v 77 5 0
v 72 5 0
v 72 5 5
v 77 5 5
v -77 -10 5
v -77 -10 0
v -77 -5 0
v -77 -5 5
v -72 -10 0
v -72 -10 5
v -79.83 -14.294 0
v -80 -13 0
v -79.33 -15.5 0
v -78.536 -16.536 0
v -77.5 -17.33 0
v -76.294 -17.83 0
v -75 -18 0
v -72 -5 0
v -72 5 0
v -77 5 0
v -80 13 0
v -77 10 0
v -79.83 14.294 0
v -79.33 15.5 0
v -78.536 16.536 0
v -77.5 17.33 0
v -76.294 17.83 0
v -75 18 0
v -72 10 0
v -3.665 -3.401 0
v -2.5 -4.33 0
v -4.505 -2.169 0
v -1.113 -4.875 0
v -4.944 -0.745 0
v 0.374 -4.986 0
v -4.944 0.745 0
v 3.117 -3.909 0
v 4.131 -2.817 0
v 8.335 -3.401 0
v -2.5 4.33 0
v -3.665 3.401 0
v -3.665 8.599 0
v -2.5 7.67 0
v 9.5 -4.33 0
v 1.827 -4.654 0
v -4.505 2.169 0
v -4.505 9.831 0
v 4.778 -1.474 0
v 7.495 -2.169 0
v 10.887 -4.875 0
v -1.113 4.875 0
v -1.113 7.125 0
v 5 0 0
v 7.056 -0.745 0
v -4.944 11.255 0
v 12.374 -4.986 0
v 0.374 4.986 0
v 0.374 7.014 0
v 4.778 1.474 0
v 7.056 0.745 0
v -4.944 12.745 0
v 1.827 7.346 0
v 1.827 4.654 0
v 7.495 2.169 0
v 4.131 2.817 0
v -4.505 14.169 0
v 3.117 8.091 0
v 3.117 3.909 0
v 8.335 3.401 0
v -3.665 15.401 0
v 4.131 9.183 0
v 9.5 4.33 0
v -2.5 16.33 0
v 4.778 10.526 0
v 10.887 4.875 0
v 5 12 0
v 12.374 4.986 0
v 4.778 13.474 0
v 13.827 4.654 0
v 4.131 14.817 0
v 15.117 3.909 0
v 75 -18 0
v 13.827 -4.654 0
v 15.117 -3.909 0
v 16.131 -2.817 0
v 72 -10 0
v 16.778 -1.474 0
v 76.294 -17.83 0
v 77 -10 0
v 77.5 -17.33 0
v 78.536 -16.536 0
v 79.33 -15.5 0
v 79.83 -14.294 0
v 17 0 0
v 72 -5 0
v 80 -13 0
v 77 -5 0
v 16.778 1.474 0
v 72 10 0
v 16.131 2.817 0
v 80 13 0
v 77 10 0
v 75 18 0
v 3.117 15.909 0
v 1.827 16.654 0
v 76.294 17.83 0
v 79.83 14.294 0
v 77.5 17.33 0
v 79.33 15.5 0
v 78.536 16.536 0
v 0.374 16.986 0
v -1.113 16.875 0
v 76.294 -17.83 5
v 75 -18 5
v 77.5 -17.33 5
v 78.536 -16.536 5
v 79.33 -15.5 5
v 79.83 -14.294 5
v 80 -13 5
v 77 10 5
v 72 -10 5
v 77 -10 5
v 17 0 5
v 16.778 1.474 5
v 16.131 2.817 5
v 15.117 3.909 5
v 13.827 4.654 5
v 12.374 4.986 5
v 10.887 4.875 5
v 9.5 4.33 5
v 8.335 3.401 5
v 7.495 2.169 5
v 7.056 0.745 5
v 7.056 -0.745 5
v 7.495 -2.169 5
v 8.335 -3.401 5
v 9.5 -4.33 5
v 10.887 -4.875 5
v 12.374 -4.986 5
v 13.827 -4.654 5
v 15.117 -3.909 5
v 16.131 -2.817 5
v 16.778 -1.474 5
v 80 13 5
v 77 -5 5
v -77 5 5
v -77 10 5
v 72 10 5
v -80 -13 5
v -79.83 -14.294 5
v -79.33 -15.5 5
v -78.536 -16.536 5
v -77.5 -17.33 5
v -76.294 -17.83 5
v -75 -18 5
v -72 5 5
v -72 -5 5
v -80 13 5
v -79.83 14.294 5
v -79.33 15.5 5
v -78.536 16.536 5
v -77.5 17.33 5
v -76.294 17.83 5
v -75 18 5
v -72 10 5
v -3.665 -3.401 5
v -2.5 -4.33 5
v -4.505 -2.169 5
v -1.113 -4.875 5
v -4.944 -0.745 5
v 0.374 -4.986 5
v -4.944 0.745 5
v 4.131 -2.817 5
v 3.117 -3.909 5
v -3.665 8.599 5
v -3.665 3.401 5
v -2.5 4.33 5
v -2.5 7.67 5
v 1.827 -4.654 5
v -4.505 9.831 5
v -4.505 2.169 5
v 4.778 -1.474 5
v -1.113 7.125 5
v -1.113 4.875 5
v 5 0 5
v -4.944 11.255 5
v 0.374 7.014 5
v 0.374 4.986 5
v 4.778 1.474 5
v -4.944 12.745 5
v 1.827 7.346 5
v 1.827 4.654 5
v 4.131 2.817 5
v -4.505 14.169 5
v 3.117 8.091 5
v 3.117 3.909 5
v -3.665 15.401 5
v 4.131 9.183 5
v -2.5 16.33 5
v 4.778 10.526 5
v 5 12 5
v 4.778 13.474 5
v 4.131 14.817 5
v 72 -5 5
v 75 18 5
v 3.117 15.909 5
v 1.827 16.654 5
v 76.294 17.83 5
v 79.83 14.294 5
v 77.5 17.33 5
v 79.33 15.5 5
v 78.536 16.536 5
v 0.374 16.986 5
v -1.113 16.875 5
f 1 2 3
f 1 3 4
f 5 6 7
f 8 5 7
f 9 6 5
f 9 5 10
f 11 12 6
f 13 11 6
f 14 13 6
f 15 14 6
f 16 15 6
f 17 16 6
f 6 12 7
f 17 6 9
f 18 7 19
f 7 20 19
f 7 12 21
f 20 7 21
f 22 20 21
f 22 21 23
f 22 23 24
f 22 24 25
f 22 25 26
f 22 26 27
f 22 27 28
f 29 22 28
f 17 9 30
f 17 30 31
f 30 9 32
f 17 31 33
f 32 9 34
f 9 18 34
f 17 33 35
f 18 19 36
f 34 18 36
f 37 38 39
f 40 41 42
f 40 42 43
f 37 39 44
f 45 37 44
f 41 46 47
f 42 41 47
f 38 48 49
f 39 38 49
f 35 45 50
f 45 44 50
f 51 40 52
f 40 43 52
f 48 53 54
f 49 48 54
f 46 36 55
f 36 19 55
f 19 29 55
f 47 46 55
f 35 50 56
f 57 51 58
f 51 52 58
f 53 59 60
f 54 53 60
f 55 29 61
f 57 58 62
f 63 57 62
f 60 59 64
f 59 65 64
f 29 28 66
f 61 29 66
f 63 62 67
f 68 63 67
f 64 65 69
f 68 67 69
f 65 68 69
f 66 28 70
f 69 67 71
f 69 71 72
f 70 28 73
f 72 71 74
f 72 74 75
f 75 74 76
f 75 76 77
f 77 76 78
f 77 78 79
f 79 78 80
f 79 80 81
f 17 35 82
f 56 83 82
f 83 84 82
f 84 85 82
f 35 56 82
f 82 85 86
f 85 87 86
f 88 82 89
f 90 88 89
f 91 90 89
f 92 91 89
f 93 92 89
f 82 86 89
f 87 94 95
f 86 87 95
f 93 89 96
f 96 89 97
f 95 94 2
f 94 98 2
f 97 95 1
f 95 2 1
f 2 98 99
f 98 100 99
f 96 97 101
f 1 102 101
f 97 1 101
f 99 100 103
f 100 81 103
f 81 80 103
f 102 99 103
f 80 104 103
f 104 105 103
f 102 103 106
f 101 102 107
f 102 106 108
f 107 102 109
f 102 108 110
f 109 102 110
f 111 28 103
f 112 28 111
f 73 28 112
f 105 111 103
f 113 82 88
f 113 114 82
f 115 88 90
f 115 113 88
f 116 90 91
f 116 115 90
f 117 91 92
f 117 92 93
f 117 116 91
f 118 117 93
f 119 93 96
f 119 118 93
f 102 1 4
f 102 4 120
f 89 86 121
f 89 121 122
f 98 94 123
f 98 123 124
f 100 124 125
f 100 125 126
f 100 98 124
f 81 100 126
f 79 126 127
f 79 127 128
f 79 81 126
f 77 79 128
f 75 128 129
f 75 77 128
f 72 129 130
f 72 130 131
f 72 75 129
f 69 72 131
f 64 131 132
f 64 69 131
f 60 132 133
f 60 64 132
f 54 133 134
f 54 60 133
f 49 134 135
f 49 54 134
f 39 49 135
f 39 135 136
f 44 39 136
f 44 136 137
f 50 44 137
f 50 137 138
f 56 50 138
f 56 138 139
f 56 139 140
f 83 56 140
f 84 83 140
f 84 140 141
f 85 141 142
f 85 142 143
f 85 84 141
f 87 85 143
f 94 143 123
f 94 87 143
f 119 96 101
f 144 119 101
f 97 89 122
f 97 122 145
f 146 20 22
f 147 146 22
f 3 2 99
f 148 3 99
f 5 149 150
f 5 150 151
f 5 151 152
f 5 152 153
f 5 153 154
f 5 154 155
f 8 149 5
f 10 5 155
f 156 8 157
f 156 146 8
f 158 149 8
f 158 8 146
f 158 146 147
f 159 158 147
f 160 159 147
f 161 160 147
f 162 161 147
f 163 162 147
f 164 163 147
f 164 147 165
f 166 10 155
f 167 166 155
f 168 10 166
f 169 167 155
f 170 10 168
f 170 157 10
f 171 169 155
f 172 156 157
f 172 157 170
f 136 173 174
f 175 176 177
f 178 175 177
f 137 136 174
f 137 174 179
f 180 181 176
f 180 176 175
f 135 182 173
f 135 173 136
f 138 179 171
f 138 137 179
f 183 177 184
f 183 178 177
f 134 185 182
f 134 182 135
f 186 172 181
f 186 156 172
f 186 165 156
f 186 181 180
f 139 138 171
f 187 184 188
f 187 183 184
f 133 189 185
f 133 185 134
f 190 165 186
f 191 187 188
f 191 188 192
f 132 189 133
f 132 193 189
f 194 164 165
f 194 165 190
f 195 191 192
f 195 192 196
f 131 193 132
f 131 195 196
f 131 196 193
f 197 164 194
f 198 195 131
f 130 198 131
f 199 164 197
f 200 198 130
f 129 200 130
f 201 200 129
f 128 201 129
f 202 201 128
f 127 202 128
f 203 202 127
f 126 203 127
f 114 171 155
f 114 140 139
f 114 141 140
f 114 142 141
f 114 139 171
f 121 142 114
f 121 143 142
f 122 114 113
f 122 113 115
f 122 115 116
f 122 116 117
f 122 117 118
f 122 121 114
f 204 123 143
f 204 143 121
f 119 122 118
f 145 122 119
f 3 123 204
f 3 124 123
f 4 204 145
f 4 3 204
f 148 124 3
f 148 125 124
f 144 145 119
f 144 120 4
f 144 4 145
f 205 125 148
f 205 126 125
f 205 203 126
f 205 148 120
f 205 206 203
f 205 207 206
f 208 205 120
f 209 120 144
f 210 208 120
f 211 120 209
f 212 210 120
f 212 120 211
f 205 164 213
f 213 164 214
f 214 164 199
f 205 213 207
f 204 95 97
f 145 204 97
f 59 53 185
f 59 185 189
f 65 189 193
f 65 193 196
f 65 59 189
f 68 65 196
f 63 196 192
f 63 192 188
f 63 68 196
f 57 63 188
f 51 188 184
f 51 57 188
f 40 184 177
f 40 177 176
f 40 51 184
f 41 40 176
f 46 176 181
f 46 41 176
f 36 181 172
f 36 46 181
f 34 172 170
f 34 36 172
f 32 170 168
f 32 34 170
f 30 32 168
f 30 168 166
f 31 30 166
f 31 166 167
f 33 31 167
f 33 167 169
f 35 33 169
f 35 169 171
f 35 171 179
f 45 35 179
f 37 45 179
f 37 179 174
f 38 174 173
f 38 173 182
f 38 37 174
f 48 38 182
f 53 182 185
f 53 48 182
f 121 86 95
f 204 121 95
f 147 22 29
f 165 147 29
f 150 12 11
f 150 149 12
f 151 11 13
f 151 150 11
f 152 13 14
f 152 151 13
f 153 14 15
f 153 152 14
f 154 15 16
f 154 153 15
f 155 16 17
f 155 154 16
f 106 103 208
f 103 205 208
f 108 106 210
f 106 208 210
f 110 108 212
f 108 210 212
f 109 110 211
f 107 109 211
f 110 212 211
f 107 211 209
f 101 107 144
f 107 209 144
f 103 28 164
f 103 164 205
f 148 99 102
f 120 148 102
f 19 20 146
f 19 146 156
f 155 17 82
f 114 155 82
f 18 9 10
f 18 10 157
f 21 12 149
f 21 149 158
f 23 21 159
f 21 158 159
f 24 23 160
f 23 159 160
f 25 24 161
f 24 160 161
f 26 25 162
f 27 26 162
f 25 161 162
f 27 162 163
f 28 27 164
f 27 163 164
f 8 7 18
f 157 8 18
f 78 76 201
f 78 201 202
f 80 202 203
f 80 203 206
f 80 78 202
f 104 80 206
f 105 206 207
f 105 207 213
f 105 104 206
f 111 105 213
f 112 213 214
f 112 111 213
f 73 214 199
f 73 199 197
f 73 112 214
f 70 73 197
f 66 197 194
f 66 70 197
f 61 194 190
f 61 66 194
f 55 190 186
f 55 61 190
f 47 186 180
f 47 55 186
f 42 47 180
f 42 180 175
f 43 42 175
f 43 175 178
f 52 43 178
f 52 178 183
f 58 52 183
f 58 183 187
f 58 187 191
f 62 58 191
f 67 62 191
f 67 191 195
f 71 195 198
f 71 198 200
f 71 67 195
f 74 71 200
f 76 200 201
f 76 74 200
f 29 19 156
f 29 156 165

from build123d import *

# Parameters (mm, degrees)
ESQUISSE1_W        = 160
ESQUISSE1_H        = 36
ESQUISSE1_R        = 5
ESQUISSE1_W_2      = 5
ESQUISSE1_H_2      = 5
BOSS_EXTRU_1_DEPTH = 5
CONG_1_R           = 5


with BuildPart() as part:
    # Esquisse1 → Boss.-Extru.1 (new body)
    with BuildSketch(Plane.XY):
        Rectangle(ESQUISSE1_W, ESQUISSE1_H)
        Circle(ESQUISSE1_R, mode=Mode.SUBTRACT)
        with Locations((12, 0)):
            Circle(ESQUISSE1_R, mode=Mode.SUBTRACT)
        with Locations((0, 12)):
            Circle(ESQUISSE1_R, mode=Mode.SUBTRACT)
        with Locations((74.5, 7.5)):
            Rectangle(ESQUISSE1_W_2, ESQUISSE1_H_2, mode=Mode.SUBTRACT)
        with Locations((74.5, -7.5)):
            Rectangle(ESQUISSE1_W_2, ESQUISSE1_H_2, mode=Mode.SUBTRACT)
        with Locations((-74.5, 7.5)):
            Rectangle(ESQUISSE1_W_2, ESQUISSE1_H_2, mode=Mode.SUBTRACT)
        with Locations((-74.5, -7.5)):
            Rectangle(ESQUISSE1_W_2, ESQUISSE1_H_2, mode=Mode.SUBTRACT)
    extrude(amount=BOSS_EXTRU_1_DEPTH)

    # Congé1
    cong_1_edges = [part.edges().sort_by_distance(p)[0] for p in [
        (-80, 18, 2.5),
        (80, 18, 2.5),
        (80, -18, 2.5),
        (-80, -18, 2.5),
    ]]
    fillet(cong_1_edges, radius=CONG_1_R)


solid = part.part
